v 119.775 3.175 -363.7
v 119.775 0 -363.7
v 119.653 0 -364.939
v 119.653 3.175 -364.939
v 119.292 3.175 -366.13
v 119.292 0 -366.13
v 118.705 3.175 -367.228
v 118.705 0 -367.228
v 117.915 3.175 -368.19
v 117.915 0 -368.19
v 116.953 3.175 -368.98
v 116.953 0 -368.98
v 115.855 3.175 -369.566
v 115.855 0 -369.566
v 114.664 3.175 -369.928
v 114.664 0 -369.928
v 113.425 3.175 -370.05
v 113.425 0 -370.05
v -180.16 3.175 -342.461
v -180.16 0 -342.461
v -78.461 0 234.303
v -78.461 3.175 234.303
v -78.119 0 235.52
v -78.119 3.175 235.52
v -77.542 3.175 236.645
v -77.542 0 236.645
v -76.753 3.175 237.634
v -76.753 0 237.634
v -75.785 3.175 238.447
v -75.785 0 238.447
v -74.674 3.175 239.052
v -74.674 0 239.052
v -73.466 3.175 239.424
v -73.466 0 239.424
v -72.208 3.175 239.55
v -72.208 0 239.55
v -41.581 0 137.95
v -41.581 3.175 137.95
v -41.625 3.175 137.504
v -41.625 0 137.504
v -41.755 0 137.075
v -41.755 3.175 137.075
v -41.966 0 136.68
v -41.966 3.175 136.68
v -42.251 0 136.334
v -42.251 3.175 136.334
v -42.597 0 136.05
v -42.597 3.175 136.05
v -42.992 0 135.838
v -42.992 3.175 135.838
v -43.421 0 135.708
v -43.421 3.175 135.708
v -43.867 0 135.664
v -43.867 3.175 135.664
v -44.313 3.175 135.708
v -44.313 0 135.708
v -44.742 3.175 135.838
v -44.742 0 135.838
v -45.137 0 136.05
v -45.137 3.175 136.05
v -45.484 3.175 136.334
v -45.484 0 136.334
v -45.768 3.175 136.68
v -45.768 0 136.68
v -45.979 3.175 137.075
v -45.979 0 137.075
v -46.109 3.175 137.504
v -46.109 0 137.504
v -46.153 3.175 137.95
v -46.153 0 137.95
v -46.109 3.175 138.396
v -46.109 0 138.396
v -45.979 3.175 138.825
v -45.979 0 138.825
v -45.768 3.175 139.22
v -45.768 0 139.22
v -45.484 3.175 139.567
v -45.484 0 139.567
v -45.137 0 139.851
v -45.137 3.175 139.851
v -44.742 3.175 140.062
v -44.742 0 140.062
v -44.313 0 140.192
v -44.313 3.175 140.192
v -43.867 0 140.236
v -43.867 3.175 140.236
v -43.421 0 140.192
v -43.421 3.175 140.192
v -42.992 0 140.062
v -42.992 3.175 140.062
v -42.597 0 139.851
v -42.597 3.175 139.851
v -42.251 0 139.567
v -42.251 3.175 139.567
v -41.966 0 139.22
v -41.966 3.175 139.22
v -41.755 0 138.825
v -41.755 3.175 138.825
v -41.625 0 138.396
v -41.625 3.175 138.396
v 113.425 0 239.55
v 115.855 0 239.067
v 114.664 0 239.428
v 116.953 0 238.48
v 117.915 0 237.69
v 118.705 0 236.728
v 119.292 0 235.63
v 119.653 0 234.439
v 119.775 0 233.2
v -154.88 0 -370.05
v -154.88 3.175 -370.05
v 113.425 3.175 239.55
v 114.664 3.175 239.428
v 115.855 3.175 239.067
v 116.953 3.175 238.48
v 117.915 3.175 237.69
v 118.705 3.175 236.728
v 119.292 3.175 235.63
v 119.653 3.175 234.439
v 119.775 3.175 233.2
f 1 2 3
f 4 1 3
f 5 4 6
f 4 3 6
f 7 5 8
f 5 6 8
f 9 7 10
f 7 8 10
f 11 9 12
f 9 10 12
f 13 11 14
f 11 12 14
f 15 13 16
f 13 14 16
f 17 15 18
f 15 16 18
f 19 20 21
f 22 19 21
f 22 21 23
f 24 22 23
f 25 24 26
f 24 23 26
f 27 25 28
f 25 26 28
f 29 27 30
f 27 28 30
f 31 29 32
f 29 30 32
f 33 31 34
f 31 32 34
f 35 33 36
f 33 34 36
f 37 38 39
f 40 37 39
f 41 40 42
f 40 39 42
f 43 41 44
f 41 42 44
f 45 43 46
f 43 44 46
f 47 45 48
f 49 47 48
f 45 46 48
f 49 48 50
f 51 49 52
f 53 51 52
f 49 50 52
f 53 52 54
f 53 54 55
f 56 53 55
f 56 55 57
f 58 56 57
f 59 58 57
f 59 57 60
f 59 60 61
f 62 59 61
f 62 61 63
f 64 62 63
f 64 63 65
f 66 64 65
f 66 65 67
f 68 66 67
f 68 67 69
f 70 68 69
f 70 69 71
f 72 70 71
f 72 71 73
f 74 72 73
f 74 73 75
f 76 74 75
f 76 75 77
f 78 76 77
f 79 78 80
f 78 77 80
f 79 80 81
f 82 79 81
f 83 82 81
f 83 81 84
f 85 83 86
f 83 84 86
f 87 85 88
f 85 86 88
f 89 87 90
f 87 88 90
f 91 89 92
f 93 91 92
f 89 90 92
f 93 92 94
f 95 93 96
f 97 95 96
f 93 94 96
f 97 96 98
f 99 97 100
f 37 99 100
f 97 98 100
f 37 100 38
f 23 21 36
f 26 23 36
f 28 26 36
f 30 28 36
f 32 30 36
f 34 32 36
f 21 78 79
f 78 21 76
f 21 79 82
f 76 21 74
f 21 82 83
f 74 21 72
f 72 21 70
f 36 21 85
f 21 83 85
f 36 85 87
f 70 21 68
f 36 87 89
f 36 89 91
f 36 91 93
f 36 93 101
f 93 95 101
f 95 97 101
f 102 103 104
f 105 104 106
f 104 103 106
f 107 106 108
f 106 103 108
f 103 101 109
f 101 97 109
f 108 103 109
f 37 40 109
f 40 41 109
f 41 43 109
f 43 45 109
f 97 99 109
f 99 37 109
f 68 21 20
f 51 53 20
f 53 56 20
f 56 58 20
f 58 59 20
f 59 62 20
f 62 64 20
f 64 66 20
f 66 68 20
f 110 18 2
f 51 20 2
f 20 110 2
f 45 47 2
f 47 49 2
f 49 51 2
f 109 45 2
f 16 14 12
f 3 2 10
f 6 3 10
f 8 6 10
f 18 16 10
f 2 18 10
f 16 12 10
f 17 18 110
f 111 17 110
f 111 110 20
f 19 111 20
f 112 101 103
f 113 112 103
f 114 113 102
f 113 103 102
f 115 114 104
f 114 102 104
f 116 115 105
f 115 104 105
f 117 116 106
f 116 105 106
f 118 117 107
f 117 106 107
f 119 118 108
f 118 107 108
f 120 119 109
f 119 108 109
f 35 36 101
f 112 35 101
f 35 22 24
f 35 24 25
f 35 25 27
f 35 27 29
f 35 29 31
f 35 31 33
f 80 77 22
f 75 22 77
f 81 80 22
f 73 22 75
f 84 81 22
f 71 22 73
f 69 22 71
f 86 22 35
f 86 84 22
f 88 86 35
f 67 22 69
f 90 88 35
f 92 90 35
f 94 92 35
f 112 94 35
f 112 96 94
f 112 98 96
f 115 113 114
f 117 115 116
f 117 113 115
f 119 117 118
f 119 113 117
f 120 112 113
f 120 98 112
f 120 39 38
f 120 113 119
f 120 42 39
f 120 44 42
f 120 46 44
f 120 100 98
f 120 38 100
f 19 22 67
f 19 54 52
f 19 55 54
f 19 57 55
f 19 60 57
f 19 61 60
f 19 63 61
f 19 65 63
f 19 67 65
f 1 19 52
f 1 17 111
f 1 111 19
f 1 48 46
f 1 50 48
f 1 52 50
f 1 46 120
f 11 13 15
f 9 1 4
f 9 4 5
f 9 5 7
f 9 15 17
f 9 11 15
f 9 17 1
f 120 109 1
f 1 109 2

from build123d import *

# Parameters (mm, degrees)
STOCK_TO_SIZE_DEPTH = 3.175
SKETCH2_R           = 2.286
MOUNTING_HOLE_DEPTH = 4.175


with BuildPart() as part:
    # Sketch1 → Stock to Size (new body)
    with BuildSketch(Plane(origin=(0, 0, 0), x_dir=(1, 0, 0), z_dir=(0, 1, 0))):
        with BuildLine():
            Line((-72.207668016, -239.550243772), (113.425121886, -239.550243772))
            ThreePointArc((113.425121886, -239.550243772), (117.915249947, -237.690371833), (119.775121886, -233.200243772))
            Line((119.775121886, -233.200243772), (119.775121886, 363.699756228))
            ThreePointArc((119.775121886, 363.699756228), (117.915249947, 368.189884288), (113.425121886, 370.049756228))
            Line((113.425121886, 370.049756228), (-154.880183722, 370.049756228))
            Line((-154.880183722, 370.049756228), (-180.160298169, 342.461352424))
            Line((-180.160298169, 342.461352424), (-78.461197248, -234.302909701))
            ThreePointArc((-78.461197248, -234.302909701), (-76.289369337, -238.064625986), (-72.207668016, -239.550243772))
        make_face()
    extrude(amount=STOCK_TO_SIZE_DEPTH)

    # Sketch2 → Mounting Hole (cut, through all)
    with BuildSketch(Plane(origin=(0, 3.175, 0), x_dir=(1, 0, 0), z_dir=(0, 1, 0))):
        with Locations((-43.86710003, -137.950243772)):
            Circle(SKETCH2_R)
    extrude(amount=-MOUNTING_HOLE_DEPTH, mode=Mode.SUBTRACT)


solid = part.part
